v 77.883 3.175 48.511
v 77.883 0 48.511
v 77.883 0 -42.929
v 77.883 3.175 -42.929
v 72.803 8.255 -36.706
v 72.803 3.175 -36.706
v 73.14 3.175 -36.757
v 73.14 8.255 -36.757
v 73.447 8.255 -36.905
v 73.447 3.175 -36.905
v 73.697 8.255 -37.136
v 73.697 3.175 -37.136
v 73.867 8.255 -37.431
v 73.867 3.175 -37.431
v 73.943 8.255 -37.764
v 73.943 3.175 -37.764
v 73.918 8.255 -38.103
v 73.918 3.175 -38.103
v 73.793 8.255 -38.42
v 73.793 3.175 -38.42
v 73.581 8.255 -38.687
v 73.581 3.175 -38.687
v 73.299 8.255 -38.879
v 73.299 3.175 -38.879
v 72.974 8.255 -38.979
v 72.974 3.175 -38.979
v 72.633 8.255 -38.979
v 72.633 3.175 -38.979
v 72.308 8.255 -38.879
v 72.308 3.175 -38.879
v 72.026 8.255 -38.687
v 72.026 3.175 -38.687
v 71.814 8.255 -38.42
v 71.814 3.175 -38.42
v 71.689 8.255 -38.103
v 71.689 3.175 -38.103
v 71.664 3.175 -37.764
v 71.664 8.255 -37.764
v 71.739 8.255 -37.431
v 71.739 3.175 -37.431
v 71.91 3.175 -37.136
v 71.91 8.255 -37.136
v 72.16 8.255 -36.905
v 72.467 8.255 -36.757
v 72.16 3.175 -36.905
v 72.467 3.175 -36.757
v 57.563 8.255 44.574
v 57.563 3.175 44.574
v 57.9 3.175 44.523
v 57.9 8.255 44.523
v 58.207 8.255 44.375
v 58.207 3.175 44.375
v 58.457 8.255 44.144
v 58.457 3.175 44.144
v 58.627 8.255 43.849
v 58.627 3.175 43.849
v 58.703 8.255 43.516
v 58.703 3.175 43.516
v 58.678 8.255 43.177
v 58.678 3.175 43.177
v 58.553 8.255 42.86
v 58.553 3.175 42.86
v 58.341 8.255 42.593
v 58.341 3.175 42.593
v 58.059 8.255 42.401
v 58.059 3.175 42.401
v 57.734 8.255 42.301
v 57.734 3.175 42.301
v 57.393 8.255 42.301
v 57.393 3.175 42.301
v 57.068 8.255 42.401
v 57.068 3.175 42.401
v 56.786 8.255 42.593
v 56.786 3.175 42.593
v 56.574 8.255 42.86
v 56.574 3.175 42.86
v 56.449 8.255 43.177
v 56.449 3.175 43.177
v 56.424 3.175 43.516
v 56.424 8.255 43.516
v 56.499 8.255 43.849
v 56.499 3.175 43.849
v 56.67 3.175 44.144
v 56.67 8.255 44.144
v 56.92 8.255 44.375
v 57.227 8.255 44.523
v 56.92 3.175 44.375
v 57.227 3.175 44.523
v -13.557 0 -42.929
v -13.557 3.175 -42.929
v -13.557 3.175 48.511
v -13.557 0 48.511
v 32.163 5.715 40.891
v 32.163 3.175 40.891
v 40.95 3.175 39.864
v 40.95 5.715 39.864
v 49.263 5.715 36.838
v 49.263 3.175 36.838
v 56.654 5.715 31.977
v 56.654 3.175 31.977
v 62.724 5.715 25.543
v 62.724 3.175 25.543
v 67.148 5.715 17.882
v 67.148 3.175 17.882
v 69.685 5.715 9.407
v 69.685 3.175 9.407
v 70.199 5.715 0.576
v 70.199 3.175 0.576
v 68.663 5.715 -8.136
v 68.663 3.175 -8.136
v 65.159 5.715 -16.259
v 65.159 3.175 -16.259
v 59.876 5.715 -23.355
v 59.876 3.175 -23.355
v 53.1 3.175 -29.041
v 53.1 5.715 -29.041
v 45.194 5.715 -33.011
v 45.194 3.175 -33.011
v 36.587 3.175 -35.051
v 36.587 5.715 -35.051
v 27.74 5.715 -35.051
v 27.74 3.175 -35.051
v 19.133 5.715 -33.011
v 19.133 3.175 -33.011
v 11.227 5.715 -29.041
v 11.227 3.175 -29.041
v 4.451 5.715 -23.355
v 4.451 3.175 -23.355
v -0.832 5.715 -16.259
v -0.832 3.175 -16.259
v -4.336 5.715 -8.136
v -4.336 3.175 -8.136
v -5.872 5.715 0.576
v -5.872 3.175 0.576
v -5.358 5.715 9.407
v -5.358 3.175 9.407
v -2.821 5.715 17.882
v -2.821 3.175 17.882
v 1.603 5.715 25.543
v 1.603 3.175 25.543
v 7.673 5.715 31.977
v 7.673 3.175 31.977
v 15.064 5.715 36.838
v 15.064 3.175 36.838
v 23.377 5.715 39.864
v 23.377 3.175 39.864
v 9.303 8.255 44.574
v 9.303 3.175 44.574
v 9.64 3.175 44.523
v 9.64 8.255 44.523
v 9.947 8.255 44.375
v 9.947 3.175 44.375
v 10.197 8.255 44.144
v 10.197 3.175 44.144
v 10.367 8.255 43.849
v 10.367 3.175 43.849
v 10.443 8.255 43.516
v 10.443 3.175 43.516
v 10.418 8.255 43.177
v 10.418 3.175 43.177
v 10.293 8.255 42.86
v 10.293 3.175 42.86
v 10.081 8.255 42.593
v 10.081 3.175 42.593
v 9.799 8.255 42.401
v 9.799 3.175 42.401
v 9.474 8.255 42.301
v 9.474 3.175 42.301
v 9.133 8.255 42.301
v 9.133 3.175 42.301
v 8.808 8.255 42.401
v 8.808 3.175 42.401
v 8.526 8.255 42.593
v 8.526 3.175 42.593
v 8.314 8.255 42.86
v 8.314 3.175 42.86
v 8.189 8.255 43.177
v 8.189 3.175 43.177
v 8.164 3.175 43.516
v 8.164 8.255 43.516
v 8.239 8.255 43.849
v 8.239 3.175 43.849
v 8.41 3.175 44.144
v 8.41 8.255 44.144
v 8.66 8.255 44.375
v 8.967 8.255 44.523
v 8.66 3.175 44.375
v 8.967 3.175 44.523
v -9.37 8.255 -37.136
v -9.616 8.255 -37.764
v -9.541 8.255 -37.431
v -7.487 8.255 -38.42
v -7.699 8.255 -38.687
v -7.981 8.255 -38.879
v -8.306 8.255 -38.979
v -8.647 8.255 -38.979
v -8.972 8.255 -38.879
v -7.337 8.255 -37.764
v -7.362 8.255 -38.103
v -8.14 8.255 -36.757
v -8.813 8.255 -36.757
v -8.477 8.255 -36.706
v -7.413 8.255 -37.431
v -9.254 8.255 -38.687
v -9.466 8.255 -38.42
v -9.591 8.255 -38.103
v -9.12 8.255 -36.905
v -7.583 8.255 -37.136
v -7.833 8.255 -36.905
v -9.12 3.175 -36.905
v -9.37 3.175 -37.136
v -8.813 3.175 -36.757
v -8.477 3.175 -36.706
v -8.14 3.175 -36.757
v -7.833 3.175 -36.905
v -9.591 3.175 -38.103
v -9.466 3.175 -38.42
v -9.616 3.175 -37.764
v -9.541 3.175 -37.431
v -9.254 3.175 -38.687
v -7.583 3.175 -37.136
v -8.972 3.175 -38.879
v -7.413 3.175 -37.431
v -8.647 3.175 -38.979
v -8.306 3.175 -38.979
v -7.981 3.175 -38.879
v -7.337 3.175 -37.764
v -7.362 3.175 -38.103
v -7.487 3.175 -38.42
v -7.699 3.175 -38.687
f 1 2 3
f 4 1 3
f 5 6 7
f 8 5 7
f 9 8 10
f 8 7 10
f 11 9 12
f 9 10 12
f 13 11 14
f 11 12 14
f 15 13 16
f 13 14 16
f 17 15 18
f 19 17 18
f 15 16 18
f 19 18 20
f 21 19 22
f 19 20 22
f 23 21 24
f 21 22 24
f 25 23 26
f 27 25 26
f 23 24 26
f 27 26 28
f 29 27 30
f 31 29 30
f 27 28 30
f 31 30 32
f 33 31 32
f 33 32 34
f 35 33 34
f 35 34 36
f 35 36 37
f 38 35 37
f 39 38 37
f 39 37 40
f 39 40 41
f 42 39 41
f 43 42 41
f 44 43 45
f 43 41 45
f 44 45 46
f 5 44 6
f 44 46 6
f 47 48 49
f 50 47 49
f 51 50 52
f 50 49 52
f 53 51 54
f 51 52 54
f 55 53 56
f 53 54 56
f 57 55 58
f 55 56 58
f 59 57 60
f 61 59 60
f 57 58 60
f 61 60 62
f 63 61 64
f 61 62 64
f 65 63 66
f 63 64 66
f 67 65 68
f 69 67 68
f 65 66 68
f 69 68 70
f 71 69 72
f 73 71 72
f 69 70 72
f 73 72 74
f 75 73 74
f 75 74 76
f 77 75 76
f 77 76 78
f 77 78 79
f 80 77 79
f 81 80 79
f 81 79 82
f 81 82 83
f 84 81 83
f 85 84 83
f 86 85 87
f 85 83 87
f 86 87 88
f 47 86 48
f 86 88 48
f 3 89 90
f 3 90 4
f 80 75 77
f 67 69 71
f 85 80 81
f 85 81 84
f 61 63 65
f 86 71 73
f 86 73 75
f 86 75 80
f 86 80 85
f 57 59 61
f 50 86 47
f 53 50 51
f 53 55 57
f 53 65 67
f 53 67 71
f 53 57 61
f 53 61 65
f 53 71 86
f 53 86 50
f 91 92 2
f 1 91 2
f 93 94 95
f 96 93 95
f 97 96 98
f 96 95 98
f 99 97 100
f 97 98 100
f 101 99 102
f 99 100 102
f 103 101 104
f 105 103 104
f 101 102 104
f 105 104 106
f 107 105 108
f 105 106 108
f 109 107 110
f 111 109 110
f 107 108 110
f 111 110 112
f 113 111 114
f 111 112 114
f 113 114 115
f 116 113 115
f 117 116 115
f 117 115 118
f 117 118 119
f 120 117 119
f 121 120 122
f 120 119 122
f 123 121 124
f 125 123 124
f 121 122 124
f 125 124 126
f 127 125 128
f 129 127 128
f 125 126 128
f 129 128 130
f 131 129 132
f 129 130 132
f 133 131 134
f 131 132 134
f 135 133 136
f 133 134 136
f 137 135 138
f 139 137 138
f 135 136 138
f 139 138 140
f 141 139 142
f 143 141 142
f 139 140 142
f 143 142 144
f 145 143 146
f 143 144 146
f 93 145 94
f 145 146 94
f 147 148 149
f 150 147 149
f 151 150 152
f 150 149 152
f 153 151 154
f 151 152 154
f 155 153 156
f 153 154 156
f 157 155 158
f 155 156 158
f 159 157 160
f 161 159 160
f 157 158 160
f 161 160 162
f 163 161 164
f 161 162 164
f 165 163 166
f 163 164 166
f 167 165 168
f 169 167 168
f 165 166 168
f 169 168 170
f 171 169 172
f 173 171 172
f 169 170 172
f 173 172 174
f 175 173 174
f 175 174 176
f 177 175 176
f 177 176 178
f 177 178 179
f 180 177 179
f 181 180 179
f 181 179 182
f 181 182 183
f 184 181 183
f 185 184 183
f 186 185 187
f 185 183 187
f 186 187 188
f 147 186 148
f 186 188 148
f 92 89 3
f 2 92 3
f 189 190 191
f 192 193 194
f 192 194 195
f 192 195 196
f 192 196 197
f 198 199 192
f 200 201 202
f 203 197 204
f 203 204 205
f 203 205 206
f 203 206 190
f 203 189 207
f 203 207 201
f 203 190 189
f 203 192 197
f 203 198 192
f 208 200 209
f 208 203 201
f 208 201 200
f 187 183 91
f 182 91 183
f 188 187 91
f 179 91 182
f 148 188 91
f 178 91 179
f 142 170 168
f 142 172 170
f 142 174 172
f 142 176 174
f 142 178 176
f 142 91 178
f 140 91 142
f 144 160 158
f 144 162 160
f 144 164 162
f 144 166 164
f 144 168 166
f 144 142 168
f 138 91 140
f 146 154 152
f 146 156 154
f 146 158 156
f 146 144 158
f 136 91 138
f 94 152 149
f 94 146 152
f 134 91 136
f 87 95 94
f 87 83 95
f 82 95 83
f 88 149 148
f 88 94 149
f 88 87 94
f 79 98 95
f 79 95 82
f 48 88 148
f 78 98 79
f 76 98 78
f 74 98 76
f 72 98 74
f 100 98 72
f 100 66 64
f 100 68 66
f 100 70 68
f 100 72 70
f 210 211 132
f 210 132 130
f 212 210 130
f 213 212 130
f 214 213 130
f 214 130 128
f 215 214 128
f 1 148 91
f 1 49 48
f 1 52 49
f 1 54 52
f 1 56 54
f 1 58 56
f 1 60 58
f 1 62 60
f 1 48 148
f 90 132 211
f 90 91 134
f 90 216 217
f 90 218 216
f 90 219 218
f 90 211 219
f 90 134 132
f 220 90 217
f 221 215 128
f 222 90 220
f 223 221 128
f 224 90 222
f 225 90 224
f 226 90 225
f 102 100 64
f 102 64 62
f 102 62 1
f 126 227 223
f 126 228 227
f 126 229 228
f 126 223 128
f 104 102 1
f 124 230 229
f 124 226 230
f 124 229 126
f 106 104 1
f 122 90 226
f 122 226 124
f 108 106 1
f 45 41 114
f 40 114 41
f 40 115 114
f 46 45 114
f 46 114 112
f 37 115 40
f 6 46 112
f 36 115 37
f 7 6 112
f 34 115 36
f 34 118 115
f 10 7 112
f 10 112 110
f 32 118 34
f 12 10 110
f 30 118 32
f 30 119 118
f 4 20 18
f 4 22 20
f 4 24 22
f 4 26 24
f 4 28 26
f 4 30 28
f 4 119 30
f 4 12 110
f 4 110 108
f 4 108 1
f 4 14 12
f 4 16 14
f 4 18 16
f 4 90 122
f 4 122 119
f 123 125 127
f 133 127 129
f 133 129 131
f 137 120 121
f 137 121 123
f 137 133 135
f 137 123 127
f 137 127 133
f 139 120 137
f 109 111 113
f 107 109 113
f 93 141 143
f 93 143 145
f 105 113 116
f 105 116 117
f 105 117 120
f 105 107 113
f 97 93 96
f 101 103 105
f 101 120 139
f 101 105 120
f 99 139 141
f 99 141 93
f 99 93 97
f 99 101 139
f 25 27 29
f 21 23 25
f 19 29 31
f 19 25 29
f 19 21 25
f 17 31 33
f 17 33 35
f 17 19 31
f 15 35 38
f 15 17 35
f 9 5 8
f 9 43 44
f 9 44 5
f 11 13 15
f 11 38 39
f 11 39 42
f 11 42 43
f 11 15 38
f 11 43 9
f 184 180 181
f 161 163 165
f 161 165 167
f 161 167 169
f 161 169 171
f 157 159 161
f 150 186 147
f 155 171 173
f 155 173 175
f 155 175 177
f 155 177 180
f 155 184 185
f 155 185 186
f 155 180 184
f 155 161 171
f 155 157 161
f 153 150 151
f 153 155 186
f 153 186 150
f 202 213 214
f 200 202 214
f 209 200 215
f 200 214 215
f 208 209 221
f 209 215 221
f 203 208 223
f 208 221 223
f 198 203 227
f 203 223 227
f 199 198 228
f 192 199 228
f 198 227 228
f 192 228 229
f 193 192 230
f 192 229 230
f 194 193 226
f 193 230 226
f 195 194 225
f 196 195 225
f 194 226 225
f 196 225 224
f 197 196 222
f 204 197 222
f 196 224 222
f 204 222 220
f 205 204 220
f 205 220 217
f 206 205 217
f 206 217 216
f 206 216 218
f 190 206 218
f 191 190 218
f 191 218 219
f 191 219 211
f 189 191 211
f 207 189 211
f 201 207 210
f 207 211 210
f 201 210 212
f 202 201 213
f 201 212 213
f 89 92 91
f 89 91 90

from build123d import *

# Parameters (mm, degrees)
SKETCH1_W           = 91.44
SKETCH1_H           = 91.44
BOSS_EXTRUDE1_DEPTH = 3.175
SKETCH2_R           = 38.1
BOSS_EXTRUDE2_DEPTH = 2.54
SKETCH4_R           = 1.143
BOSS_EXTRUDE4_DEPTH = 5.08
SKETCH5_R           = 1.143
BOSS_EXTRUDE5_DEPTH = 5.08


with BuildPart() as part:
    # Sketch1 → Boss-Extrude1 (new body)
    with BuildSketch(Plane(origin=(0, 0, 0), x_dir=(1, 0, 0), z_dir=(0, 1, 0))):
        with Locations((32.163488372, -2.791046512)):
            Rectangle(SKETCH1_W, SKETCH1_H)
    extrude(amount=BOSS_EXTRUDE1_DEPTH)

    # Sketch2 → Boss-Extrude2 (add)
    with BuildSketch(Plane(origin=(0, 3.175, 0), x_dir=(1, 0, 0), z_dir=(0, 1, 0))):
        with Locations(Location((32.163488372, -2.791046512, 0), (0, 0, 270))):
            Circle(SKETCH2_R)
    extrude(amount=BOSS_EXTRUDE2_DEPTH)

    # Sketch4 → Boss-Extrude4 (add)
    with BuildSketch(Plane(origin=(0, 3.175, 0), x_dir=(1, 0, 0), z_dir=(0, 1, 0))):
        with Locations(Location((9.303488372, -43.431046512, 0), (0, 0, 270))):
            Circle(SKETCH4_R)
        with Locations(Location((57.563488372, -43.431046512, 0), (0, 0, 270))):
            Circle(SKETCH4_R)
    extrude(amount=BOSS_EXTRUDE4_DEPTH)

    # Sketch5 → Boss-Extrude5 (add)
    with BuildSketch(Plane(origin=(0, 3.175, 0), x_dir=(1, 0, 0), z_dir=(0, 1, 0))):
        with Locations(Location((-8.476511628, 37.848953488, 0), (0, 0, 270))):
            Circle(SKETCH5_R)
        with Locations(Location((72.803488372, 37.848953488, 0), (0, 0, 270))):
            Circle(SKETCH5_R)
    extrude(amount=BOSS_EXTRUDE5_DEPTH)


solid = part.part
